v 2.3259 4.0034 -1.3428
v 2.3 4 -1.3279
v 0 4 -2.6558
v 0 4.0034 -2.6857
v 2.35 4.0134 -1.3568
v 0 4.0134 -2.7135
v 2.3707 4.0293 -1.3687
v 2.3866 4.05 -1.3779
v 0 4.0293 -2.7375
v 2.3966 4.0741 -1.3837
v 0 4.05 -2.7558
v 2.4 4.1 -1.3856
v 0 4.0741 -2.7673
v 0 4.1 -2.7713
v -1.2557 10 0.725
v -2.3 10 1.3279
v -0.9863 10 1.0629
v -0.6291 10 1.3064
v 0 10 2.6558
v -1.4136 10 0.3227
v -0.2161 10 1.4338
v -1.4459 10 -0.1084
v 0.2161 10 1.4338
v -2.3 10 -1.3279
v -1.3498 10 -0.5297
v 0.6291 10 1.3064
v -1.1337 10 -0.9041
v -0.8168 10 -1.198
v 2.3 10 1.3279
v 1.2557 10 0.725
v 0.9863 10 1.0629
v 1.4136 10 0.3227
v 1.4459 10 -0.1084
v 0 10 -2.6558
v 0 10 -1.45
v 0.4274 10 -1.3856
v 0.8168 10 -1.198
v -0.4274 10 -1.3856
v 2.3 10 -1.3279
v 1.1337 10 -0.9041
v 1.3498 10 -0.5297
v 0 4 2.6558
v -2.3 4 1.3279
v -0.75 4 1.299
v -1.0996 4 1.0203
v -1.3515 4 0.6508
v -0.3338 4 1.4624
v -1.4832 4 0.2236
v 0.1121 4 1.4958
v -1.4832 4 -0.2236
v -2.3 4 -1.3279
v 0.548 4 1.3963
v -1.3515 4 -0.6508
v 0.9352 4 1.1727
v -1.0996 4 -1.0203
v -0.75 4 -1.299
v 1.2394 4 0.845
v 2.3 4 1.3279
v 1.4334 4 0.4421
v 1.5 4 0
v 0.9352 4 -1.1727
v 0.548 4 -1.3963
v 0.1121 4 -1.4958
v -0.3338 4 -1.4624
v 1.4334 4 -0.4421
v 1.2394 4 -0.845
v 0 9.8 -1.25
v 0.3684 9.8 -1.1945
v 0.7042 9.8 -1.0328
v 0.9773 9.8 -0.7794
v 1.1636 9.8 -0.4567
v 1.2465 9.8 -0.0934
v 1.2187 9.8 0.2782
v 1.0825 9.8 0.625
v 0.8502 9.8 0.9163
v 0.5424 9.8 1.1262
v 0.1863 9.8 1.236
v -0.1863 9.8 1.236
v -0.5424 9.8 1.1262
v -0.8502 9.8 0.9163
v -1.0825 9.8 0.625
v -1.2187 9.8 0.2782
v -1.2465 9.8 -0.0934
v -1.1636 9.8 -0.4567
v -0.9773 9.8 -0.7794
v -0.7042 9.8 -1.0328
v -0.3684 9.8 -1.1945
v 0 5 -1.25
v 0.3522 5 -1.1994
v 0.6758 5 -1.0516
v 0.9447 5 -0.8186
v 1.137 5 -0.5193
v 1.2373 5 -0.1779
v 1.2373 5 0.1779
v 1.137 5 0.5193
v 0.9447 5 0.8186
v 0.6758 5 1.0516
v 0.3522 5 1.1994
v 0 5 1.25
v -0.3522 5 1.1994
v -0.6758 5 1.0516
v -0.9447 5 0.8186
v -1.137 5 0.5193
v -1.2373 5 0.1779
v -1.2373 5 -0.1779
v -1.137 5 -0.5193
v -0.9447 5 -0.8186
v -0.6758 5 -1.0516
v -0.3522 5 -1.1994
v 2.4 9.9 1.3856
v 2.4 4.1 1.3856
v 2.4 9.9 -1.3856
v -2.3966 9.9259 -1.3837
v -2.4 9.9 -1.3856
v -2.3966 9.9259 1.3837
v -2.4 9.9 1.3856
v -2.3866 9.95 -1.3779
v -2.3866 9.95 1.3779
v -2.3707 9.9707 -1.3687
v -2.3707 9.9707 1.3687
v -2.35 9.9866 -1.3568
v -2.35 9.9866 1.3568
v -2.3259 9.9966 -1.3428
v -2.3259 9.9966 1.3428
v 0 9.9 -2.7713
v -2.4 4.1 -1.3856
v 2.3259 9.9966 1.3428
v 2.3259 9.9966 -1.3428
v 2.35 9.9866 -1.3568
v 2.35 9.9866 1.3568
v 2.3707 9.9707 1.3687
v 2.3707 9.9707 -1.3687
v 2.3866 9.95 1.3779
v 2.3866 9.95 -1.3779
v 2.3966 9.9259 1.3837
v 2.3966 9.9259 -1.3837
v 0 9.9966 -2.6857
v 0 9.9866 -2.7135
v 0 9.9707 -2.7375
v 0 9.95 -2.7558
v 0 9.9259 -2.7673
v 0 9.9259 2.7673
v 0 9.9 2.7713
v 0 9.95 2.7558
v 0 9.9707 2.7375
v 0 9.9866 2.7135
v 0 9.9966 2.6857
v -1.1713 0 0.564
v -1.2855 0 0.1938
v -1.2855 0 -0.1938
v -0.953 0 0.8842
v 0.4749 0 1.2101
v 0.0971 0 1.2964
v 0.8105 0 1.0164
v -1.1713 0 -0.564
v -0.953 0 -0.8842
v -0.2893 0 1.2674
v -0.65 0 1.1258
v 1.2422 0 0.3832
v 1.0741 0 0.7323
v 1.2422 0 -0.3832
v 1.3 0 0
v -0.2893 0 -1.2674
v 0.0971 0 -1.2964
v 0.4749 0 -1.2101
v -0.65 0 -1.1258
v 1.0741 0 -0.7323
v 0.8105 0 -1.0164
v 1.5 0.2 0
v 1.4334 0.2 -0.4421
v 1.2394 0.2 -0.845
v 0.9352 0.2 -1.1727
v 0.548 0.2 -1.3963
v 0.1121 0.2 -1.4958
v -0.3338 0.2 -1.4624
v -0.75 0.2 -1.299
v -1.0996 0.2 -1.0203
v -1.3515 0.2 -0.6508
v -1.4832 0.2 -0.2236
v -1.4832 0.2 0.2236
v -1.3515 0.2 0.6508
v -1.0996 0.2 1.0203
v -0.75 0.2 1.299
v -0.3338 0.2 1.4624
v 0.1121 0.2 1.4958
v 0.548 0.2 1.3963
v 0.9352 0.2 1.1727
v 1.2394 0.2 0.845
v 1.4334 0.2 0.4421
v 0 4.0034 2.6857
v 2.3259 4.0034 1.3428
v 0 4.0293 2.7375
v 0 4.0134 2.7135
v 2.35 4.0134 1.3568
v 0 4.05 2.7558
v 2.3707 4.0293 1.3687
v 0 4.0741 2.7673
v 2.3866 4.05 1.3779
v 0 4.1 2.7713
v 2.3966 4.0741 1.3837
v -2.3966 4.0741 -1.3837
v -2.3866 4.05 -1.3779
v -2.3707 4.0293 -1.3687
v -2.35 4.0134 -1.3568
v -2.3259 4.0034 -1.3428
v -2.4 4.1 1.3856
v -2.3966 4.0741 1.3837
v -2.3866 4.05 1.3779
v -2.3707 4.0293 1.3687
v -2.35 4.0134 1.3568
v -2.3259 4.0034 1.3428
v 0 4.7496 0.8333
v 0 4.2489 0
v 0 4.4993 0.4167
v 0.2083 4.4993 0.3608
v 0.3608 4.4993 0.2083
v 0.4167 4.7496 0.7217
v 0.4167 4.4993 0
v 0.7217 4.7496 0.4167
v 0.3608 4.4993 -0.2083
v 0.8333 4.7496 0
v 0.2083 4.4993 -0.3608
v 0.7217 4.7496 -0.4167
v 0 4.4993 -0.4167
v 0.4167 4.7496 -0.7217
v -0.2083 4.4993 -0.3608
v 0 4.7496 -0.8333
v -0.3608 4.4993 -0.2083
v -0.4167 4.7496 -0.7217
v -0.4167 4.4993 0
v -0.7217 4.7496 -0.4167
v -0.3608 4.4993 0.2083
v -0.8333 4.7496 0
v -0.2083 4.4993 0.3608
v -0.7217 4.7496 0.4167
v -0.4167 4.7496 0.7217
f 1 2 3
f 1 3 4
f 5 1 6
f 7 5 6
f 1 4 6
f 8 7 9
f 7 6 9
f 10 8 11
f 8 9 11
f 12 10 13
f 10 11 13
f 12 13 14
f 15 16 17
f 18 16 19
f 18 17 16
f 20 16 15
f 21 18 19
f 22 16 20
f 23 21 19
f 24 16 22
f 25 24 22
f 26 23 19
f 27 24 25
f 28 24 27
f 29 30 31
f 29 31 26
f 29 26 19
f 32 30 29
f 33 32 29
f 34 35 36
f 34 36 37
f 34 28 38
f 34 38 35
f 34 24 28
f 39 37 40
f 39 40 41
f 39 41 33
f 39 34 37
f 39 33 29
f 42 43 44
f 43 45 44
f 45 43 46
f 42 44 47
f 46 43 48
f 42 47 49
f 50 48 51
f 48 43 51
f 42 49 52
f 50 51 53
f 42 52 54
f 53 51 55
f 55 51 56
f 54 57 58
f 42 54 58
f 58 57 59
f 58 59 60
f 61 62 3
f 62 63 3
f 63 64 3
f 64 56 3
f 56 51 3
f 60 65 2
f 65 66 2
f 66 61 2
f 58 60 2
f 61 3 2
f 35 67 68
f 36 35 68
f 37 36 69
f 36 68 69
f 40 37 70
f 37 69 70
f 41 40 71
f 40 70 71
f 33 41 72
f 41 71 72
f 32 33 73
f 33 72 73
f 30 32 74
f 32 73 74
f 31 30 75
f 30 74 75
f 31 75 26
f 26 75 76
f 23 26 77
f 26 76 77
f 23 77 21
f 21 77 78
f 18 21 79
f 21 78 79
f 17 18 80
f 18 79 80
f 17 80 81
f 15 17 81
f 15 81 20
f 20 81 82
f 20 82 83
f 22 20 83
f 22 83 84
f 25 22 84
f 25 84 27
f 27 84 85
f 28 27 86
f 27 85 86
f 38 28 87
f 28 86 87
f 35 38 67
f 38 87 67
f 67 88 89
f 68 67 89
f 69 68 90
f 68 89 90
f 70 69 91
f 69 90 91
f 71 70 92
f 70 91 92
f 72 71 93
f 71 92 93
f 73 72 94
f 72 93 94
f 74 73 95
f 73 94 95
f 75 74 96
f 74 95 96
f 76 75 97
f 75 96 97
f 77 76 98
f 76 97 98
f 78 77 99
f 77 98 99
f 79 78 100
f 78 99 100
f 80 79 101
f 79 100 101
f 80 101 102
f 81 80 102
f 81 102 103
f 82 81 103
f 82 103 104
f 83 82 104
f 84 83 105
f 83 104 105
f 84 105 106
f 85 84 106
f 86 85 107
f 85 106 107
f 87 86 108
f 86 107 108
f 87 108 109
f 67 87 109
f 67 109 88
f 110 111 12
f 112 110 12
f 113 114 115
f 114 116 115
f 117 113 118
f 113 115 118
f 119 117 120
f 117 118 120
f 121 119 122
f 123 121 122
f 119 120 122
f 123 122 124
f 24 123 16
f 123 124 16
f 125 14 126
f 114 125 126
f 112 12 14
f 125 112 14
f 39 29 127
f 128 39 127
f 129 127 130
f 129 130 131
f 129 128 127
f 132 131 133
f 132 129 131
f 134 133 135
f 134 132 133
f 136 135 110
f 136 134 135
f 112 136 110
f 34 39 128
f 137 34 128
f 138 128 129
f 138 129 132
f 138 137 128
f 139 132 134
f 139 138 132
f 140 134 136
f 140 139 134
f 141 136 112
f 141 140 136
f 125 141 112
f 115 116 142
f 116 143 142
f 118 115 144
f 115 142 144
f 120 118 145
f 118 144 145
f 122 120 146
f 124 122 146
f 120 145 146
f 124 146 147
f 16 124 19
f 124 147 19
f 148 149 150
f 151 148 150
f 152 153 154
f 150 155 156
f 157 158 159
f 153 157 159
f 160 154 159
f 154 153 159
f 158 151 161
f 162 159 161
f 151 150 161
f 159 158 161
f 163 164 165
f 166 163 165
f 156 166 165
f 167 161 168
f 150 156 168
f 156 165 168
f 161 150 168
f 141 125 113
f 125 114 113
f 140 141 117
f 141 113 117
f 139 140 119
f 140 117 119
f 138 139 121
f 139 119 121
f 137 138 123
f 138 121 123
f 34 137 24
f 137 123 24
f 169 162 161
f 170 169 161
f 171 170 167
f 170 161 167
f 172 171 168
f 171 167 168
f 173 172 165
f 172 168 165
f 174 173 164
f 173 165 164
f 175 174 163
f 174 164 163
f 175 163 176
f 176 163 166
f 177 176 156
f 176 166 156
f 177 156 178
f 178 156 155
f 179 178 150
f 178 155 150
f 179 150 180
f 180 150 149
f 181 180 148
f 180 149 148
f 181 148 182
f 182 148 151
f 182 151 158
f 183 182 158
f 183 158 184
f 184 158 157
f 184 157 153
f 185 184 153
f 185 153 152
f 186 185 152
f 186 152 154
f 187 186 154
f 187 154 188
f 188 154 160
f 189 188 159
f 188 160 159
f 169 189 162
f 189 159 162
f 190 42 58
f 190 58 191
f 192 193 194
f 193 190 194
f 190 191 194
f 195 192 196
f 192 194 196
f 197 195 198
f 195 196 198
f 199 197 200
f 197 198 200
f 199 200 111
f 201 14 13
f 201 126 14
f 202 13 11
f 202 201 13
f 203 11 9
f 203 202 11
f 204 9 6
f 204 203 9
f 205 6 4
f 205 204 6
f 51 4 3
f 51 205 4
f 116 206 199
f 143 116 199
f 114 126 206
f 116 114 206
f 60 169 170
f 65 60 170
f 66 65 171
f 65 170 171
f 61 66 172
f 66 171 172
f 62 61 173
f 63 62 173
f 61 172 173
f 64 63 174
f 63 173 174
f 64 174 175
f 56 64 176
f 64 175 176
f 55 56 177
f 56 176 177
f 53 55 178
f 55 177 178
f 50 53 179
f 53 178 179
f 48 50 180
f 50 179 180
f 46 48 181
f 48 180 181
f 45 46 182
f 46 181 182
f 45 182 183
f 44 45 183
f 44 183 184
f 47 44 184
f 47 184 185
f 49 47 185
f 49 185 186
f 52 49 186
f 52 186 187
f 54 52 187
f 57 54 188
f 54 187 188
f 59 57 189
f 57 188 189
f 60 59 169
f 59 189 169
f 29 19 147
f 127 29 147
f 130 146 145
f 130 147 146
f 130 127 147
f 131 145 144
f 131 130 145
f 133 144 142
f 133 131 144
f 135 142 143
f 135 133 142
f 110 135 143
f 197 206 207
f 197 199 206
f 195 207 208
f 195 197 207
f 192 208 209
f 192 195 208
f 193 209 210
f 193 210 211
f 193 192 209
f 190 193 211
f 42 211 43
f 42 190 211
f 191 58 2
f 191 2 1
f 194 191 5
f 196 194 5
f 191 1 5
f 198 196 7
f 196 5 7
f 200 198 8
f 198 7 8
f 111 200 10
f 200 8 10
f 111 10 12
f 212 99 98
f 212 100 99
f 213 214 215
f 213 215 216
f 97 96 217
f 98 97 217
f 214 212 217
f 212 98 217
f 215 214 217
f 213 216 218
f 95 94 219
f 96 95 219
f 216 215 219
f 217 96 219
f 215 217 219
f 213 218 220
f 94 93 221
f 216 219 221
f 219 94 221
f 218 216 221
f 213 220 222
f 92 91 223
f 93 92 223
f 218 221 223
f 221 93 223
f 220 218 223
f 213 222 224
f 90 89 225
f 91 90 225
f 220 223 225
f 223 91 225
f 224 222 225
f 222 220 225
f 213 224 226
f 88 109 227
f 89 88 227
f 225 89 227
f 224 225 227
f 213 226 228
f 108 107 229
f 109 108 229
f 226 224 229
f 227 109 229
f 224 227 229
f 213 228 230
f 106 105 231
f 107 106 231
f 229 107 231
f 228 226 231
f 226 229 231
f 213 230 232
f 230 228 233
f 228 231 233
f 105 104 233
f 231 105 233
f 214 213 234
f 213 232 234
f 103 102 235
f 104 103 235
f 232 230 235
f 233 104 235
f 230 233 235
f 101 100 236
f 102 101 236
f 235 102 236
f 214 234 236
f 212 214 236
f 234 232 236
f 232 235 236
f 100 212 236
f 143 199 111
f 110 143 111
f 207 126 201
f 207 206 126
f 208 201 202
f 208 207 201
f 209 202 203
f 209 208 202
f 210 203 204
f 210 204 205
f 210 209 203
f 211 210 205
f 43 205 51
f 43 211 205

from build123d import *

# Parameters (mm, degrees)
SKETCH_2_R            = 1.5
EXTRUDE_1_DEPTH       = 4
EXTRUDE_2_DEPTH       = 6
FILLET_1_R            = 0.1
HOLE_WIZARD_M31_D     = 2.5
HOLE_WIZARD_M31_DEPTH = 5
HOLE_WIZARD_M31_TIP   = 0.751075774
CHAMFER_2_SIZE        = 0.2


with BuildPart() as part:
    # Эскиз2 → Бобышка-Вытянуть1 (new body)
    with BuildSketch(Plane(origin=(0, 0, 0), x_dir=(1, 0, 0), z_dir=(0, 1, 0))):
        Circle(SKETCH_2_R)
    extrude(amount=EXTRUDE_1_DEPTH)

    # Эскиз3 → Бобышка-Вытянуть2 (add)
    with BuildSketch(Plane(origin=(0, 4, 0), x_dir=(1, 0, 0), z_dir=(0, 1, 0))):
        Polygon((-2.4, 1.385640646), (-2.4, -1.385640646), (0, -2.771281292), (2.4, -1.385640646), (2.4, 1.385640646), (0, 2.771281292), align=None)
    extrude(amount=EXTRUDE_2_DEPTH)

    # Скругление1
    fillet_1_edges = [part.edges().sort_by_distance(p)[0] for p in [
        (-1.2, 4, -2.078460969),
        (-2.4, 4, 0),
        (-1.2, 4, 2.078460969),
        (1.2, 4, 2.078460969),
        (2.4, 4, 0),
        (1.2, 4, -2.078460969),
        (-1.2, 10, -2.078460969),
        (-2.4, 10, 0),
        (-1.2, 10, 2.078460969),
        (1.2, 10, 2.078460969),
        (2.4, 10, 0),
        (1.2, 10, -2.078460969),
    ]]
    fillet(fillet_1_edges, radius=FILLET_1_R)

    # Отверстие обработанное метчиком M31
    with Locations(Plane.ZX.offset(10)):
        with Locations((0, 0)):
            Hole(HOLE_WIZARD_M31_D / 2, depth=HOLE_WIZARD_M31_DEPTH)
            with Locations((0, 0, -(HOLE_WIZARD_M31_DEPTH + HOLE_WIZARD_M31_TIP / 2))):  # 118° drill point
                Cone(0, HOLE_WIZARD_M31_D / 2, HOLE_WIZARD_M31_TIP, mode=Mode.SUBTRACT)

    # Фаска2
    chamfer_2_edges = [part.edges().sort_by_distance(p)[0] for p in [
        (-1.5, 0, 0),
        (0, 10, 1.25),
    ]]
    chamfer(chamfer_2_edges, length=CHAMFER_2_SIZE)


solid = part.part
